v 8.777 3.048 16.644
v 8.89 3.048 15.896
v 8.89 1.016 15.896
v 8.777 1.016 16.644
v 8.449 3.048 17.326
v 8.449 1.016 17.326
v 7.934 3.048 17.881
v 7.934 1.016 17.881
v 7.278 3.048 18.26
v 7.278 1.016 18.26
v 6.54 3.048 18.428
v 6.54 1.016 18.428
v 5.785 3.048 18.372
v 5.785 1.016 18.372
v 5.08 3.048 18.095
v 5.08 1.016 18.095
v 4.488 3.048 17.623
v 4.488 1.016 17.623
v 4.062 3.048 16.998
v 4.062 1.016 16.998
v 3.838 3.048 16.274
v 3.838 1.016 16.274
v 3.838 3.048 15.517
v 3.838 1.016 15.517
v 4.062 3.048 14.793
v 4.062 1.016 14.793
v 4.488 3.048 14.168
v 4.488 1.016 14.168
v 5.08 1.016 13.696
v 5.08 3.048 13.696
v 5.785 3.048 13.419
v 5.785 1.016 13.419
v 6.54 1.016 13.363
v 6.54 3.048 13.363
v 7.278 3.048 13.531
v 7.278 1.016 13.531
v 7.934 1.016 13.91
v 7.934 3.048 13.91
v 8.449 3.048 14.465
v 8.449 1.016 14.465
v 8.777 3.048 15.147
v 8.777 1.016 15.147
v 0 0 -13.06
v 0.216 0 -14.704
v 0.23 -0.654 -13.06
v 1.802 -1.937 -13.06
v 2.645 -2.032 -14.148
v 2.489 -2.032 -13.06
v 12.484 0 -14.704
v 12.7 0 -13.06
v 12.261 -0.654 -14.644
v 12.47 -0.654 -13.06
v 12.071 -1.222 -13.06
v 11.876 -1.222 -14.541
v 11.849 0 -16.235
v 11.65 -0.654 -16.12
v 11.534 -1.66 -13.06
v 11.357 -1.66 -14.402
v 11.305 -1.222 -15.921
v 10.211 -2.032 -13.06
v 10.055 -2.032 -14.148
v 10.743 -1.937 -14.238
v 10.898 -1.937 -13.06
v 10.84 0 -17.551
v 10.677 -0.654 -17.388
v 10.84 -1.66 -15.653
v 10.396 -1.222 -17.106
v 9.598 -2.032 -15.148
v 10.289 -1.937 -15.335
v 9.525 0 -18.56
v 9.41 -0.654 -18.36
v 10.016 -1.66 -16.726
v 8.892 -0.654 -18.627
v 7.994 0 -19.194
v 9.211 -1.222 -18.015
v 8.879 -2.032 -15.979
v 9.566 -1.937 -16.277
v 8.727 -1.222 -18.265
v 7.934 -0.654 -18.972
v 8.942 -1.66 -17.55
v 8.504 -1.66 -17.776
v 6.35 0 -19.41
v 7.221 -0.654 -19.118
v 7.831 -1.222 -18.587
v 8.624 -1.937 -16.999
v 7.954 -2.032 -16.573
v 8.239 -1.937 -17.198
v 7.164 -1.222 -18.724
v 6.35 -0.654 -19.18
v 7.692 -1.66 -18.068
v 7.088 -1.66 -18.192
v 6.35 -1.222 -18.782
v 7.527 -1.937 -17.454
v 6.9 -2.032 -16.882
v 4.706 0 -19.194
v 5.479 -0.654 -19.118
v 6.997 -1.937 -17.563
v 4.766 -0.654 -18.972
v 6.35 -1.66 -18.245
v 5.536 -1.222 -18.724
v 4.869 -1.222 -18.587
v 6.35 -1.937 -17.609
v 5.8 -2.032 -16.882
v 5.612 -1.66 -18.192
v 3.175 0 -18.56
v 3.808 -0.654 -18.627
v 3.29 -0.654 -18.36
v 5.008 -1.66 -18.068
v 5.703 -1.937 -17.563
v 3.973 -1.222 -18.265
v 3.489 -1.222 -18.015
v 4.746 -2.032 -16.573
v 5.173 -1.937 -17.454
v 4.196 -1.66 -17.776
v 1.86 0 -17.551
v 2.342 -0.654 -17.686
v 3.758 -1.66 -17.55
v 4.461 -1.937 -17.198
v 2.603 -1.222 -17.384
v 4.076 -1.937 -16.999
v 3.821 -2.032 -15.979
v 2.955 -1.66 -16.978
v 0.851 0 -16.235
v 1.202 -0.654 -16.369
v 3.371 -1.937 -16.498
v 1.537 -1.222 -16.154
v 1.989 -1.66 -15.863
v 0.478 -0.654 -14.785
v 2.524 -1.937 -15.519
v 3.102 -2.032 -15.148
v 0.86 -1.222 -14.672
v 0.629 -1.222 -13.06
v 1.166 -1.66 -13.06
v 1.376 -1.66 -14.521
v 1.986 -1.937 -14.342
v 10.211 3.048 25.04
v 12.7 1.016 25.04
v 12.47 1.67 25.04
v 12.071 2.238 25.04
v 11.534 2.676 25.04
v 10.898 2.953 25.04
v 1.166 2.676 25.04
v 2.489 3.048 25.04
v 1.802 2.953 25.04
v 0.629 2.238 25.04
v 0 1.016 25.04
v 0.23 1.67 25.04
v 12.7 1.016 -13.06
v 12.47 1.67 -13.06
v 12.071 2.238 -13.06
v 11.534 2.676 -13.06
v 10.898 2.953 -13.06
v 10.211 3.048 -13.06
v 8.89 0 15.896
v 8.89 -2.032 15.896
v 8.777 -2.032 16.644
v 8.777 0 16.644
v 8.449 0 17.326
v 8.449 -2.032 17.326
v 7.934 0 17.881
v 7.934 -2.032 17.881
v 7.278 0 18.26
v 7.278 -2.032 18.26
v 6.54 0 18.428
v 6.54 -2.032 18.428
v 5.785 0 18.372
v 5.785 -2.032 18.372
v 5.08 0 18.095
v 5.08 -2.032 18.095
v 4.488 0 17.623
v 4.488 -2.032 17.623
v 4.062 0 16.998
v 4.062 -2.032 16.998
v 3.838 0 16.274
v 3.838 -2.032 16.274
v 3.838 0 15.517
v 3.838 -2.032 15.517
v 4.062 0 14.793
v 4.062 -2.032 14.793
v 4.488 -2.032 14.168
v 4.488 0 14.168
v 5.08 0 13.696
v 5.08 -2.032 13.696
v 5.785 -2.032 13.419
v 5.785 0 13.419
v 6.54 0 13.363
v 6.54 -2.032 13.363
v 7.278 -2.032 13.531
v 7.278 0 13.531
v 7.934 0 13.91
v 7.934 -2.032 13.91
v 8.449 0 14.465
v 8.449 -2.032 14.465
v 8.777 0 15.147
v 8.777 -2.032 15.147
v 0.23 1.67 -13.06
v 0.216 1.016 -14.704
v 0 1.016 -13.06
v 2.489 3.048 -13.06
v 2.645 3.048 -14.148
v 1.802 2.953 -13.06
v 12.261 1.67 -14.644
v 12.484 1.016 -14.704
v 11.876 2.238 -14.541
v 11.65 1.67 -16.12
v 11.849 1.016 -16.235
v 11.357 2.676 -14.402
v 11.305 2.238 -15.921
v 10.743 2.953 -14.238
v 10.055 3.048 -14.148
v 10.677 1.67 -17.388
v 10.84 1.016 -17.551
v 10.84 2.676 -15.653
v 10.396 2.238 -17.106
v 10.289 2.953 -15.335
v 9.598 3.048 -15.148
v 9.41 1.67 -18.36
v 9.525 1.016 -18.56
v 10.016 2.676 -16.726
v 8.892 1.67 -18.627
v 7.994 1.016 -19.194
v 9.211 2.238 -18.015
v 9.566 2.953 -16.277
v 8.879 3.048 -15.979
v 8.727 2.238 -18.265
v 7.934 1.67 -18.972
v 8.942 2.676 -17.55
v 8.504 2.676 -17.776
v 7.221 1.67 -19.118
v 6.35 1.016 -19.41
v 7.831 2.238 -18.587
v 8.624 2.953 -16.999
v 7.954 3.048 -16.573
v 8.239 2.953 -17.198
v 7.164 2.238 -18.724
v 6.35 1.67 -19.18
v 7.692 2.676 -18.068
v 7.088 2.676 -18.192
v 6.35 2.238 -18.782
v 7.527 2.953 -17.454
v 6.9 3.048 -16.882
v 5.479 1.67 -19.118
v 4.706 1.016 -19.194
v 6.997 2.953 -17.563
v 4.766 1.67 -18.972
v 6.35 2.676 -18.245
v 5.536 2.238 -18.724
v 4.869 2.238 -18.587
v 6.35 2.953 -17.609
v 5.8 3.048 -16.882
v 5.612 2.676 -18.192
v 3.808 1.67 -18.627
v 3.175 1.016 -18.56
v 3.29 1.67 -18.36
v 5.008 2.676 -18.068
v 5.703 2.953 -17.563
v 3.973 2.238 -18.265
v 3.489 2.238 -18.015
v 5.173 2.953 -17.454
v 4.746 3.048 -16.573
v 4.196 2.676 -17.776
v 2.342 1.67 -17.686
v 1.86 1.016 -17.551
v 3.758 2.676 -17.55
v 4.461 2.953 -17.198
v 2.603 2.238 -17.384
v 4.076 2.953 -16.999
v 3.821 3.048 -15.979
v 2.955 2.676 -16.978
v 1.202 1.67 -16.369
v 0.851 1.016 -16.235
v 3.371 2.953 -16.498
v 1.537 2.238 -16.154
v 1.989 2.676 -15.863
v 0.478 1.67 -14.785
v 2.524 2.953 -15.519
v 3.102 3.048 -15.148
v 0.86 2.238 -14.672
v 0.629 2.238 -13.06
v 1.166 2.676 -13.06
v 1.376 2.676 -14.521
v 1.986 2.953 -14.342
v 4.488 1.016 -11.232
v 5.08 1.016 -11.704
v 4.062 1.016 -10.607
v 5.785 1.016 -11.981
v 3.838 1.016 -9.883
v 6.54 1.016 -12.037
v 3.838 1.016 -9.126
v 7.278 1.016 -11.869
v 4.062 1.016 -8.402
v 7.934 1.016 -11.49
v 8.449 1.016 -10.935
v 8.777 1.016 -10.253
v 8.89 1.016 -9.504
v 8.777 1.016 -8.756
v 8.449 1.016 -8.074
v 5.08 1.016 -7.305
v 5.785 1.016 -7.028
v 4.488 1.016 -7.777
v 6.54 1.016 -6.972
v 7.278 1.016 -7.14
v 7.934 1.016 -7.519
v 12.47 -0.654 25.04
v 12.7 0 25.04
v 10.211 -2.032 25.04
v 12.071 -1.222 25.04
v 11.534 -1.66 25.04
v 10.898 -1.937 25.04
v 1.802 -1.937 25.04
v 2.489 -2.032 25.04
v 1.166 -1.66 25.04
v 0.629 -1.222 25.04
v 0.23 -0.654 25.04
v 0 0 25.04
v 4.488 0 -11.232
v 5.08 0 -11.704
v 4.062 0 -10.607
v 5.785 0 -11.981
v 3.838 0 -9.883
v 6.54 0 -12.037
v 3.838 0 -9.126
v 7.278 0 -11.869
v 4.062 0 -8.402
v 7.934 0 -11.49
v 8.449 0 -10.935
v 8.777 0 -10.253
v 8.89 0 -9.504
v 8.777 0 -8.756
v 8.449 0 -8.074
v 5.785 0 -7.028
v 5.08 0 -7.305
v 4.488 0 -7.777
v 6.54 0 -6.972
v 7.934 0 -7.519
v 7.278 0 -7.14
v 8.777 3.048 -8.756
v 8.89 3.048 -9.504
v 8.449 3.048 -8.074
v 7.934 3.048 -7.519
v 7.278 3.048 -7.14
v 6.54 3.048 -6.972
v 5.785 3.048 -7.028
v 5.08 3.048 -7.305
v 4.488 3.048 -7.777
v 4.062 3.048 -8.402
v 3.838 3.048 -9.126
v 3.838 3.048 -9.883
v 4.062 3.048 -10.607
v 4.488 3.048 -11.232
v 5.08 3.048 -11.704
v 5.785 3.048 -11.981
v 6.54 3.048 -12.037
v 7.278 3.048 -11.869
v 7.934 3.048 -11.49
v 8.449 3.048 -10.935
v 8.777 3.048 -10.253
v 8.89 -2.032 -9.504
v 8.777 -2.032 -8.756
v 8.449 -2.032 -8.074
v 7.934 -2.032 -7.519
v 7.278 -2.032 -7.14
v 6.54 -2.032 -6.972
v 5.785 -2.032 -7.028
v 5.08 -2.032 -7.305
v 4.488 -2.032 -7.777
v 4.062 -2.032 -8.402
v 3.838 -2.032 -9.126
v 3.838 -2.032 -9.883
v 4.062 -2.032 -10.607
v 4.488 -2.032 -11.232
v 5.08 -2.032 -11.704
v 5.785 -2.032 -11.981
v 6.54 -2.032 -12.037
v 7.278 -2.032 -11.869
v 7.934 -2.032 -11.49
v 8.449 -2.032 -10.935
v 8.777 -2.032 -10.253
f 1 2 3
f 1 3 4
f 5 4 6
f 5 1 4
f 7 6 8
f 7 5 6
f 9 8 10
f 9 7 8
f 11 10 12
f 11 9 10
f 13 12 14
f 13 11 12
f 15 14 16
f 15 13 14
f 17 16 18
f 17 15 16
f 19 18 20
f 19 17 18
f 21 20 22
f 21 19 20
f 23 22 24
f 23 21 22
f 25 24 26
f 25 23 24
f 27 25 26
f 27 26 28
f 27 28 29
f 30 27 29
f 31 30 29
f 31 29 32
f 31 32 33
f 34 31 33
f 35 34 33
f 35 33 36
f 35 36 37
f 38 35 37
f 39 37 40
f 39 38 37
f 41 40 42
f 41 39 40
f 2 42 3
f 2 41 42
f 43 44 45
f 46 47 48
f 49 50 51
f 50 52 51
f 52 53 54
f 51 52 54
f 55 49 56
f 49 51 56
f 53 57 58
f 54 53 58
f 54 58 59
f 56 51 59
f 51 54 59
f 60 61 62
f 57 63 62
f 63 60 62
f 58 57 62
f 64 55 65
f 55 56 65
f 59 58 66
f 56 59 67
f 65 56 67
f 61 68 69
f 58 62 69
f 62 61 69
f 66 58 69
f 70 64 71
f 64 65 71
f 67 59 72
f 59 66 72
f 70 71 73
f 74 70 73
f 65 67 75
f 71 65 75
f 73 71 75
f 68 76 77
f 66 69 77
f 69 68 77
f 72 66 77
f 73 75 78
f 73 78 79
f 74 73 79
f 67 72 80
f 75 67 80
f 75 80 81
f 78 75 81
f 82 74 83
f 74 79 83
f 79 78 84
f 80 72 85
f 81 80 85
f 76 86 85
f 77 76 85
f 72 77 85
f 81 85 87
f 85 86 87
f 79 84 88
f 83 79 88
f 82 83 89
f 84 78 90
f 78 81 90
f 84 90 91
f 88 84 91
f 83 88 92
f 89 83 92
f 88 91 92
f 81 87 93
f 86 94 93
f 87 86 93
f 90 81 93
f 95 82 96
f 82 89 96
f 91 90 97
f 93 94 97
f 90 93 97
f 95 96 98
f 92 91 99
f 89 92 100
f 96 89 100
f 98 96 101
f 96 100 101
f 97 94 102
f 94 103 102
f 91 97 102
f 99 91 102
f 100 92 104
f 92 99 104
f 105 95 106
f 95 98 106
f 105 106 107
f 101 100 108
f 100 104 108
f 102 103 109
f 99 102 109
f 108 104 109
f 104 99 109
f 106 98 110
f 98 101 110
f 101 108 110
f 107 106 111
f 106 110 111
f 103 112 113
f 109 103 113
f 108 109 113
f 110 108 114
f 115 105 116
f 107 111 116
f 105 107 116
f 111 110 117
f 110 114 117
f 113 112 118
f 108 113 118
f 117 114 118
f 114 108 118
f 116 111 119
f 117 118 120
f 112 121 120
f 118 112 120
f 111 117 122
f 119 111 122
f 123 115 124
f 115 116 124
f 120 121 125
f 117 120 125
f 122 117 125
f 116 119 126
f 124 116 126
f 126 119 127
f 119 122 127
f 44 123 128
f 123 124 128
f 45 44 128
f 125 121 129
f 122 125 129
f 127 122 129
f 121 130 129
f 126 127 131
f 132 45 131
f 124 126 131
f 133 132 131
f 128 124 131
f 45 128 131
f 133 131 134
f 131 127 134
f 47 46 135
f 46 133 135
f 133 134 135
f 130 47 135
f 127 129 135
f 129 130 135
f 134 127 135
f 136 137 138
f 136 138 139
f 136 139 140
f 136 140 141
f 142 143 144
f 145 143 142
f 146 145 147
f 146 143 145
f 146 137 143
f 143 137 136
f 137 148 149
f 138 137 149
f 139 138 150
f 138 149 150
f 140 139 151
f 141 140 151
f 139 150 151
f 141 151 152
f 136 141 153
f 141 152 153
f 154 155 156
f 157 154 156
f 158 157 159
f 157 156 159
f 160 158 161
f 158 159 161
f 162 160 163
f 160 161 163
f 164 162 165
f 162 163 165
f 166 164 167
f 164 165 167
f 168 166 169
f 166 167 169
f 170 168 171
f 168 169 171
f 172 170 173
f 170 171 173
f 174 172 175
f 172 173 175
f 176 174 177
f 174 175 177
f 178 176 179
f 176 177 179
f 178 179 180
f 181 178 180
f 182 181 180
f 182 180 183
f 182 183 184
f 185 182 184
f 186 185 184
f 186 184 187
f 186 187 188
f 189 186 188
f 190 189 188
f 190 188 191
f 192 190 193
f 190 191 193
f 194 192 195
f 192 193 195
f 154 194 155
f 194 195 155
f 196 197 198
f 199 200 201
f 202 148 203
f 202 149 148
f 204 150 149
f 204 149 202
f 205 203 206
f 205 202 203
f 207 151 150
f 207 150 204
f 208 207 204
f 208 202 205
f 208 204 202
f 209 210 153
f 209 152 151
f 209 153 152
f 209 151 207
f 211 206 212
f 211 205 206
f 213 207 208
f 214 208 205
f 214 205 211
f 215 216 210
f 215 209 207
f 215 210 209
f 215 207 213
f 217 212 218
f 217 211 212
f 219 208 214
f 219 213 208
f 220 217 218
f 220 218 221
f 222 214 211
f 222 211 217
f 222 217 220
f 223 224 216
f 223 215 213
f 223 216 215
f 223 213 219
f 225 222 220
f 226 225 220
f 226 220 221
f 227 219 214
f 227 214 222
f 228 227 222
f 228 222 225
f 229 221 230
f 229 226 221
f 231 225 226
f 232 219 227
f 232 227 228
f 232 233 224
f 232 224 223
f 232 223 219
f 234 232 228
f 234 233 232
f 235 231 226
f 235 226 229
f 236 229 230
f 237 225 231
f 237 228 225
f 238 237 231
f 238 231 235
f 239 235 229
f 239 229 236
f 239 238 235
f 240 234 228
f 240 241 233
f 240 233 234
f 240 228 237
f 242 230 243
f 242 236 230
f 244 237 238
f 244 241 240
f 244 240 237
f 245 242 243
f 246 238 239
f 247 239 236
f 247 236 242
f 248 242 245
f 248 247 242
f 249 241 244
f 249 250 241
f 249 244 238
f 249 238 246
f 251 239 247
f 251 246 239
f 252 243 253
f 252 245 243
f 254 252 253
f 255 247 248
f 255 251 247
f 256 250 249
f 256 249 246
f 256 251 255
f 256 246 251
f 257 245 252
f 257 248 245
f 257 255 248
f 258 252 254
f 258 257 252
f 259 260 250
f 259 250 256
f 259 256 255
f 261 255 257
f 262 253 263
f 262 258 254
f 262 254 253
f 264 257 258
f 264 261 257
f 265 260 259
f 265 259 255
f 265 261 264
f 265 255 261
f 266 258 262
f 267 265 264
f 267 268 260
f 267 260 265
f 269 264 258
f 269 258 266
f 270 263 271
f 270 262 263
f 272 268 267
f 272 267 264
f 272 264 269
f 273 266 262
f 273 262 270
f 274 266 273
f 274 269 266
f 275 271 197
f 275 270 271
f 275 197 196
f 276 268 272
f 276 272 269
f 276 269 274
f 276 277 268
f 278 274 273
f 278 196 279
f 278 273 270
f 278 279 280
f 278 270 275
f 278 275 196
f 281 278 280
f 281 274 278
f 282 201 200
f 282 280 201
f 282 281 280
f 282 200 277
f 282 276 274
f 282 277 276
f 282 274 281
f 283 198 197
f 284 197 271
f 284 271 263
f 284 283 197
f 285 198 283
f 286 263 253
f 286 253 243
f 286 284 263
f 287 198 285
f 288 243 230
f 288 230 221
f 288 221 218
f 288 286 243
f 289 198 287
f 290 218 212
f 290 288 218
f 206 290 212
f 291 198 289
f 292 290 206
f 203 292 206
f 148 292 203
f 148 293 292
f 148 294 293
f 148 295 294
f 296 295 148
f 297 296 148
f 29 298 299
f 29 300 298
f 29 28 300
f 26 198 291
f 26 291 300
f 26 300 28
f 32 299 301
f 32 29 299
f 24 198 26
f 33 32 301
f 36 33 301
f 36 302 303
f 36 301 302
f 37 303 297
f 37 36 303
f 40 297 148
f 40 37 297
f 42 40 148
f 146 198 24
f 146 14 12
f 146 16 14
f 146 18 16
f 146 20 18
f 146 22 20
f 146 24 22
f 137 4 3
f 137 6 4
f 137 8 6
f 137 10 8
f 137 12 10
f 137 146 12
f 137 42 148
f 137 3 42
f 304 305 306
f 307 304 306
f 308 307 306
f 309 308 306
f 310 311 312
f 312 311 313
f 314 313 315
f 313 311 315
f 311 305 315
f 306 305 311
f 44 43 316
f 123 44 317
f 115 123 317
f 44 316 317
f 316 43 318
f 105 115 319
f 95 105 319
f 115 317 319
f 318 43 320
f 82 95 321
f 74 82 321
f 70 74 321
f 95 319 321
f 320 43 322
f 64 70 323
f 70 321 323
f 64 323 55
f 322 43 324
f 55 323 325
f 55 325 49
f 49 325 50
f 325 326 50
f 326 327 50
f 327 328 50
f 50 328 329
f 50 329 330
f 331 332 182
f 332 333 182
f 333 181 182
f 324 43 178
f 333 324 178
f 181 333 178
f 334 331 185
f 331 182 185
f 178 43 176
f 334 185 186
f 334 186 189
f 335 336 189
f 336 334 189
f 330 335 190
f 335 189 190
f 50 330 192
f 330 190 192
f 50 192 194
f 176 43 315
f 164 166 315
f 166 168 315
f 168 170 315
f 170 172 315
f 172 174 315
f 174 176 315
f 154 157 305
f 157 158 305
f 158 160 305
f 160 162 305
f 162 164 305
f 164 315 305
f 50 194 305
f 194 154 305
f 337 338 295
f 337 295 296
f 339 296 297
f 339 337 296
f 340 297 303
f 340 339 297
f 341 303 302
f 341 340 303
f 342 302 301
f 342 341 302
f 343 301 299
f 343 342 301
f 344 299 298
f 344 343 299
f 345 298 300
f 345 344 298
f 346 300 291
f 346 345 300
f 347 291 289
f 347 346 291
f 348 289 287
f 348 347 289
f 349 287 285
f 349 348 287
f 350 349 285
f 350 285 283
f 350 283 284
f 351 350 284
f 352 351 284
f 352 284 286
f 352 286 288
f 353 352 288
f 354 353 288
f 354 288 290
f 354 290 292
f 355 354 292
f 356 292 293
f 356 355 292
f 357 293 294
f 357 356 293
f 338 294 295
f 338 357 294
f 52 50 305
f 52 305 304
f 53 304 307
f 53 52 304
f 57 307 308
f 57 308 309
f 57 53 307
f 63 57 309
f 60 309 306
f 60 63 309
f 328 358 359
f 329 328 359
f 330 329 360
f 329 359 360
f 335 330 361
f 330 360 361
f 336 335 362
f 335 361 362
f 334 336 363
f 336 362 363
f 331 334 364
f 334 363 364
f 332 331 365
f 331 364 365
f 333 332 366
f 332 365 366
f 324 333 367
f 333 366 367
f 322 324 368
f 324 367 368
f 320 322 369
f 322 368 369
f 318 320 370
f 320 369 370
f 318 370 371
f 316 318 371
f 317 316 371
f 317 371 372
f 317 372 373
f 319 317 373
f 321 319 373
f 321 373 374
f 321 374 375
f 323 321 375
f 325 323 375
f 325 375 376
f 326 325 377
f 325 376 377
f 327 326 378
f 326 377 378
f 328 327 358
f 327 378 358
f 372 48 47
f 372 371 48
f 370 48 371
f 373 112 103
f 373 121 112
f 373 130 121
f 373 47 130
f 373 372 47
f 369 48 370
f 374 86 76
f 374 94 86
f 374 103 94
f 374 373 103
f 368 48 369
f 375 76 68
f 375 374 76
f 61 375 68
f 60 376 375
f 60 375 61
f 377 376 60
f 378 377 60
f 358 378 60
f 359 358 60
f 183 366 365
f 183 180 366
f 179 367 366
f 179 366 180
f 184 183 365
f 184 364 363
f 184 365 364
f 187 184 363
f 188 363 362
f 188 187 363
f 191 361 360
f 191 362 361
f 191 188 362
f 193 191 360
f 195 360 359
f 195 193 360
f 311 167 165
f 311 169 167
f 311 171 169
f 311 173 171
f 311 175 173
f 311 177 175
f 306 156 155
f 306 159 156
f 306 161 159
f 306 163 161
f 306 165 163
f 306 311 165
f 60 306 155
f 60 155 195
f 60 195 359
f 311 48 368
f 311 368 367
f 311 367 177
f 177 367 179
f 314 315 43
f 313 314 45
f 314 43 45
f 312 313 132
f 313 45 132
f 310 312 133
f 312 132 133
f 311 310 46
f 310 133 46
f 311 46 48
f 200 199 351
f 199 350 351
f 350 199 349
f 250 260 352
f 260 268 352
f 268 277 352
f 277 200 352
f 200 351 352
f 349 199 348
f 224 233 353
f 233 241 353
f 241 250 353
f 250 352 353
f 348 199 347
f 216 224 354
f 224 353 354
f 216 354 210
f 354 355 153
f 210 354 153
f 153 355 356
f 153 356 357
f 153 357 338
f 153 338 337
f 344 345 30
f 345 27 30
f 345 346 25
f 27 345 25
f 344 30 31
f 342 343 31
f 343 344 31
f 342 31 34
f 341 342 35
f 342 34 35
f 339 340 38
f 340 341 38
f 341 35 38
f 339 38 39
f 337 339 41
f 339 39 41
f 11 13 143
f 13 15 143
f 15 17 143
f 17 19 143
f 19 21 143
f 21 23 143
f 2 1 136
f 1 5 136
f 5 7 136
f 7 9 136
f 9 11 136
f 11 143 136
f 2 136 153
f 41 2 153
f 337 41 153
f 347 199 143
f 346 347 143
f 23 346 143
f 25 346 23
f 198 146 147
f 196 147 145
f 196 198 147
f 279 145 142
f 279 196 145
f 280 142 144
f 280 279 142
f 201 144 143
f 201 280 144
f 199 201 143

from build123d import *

# Parameters (mm, degrees)
F1_DEPTH    = 2.032
F2_R        = 2.54
F3_DEPTH    = 2.032
F4_T1_DEPTH = 44.3217039467
F4_T4_ANGLE = 180


# Not quite as in the source:
# - a fillet or chamfer that OpenCascade refuses, or shapes differently, is made with other operations: its cross-section is extruded or revolved along the edge and cut away or added


with BuildPart() as f1:
    # F0 (on Front) → F1 (new body)
    with BuildSketch(Plane.XZ):
        with BuildLine():
            Line((12.7, 25.0395175091), (0, 25.0395175091))
            Line((0, 25.0395175091), (0, -13.0604824909))
            ThreePointArc((0, -13.0604824909), (1.8598719395, -17.5506105514), (6.35, -19.4104824909))
            ThreePointArc((6.35, -19.4104824909), (10.8401280605, -17.5506105514), (12.7, -13.0604824909))
            Line((12.7, -13.0604824909), (12.7, 25.0395175091))
        make_face()
    extrude(amount=F1_DEPTH)

    # F2 (on face) → F3 (cut)
    with BuildSketch(Plane.XZ.offset(2.032)):
        with Locations((6.35, -9.5044824909)):
            Circle(F2_R)
        with Locations((6.35, 15.8955175091)):
            Circle(F2_R)
    extrude(amount=-F3_DEPTH, mode=Mode.SUBTRACT)

    # F4: fillet of radius 2.54 on 1 edges, made by hand

    # F4_s2 → F4_t1 (cut)
    with BuildSketch(Plane.XY.offset(-13.0604824909)):
        with BuildLine():
            ThreePointArc((12.7, 0), (11.8177554727, -1.4594755399), (10.2113184213, -2.032))
            Line((10.2113184213, -2.032), (12.7, -2.032))
            Line((12.7, -2.032), (12.7, 0))
        make_face()
        with BuildLine():
            ThreePointArc((0, 0), (0.8822445273, -1.4594755399), (2.4886815787, -2.032))
            Line((2.4886815787, -2.032), (0, -2.032))
            Line((0, -2.032), (0, 0))
        make_face()
    extrude(amount=F4_T1_DEPTH, mode=Mode.SUBTRACT)

    # F4_s3 → F4_t4 (revolve, cut)
    with BuildSketch(Plane.XY.offset(-13.0604824909)):
        with BuildLine():
            ThreePointArc((12.7, 0), (11.8177554727, -1.4594755399), (10.2113184213, -2.032))
            Line((10.2113184213, -2.032), (12.7, -2.032))
            Line((12.7, -2.032), (12.7, 0))
        make_face()
    revolve(axis=Axis((6.35, -2.032, -13.0604824909), (0, 1, 0)), revolution_arc=F4_T4_ANGLE, mode=Mode.SUBTRACT)


with BuildPart() as f6_1:
    # F6: instance of F1
    add(f1.part.mirror(Plane(origin=(6.35, 0.508, 3.4947340596), x_dir=(1, 0, 0), z_dir=(0, 1, 0))))


solid = Compound([f1.part, f6_1.part])
